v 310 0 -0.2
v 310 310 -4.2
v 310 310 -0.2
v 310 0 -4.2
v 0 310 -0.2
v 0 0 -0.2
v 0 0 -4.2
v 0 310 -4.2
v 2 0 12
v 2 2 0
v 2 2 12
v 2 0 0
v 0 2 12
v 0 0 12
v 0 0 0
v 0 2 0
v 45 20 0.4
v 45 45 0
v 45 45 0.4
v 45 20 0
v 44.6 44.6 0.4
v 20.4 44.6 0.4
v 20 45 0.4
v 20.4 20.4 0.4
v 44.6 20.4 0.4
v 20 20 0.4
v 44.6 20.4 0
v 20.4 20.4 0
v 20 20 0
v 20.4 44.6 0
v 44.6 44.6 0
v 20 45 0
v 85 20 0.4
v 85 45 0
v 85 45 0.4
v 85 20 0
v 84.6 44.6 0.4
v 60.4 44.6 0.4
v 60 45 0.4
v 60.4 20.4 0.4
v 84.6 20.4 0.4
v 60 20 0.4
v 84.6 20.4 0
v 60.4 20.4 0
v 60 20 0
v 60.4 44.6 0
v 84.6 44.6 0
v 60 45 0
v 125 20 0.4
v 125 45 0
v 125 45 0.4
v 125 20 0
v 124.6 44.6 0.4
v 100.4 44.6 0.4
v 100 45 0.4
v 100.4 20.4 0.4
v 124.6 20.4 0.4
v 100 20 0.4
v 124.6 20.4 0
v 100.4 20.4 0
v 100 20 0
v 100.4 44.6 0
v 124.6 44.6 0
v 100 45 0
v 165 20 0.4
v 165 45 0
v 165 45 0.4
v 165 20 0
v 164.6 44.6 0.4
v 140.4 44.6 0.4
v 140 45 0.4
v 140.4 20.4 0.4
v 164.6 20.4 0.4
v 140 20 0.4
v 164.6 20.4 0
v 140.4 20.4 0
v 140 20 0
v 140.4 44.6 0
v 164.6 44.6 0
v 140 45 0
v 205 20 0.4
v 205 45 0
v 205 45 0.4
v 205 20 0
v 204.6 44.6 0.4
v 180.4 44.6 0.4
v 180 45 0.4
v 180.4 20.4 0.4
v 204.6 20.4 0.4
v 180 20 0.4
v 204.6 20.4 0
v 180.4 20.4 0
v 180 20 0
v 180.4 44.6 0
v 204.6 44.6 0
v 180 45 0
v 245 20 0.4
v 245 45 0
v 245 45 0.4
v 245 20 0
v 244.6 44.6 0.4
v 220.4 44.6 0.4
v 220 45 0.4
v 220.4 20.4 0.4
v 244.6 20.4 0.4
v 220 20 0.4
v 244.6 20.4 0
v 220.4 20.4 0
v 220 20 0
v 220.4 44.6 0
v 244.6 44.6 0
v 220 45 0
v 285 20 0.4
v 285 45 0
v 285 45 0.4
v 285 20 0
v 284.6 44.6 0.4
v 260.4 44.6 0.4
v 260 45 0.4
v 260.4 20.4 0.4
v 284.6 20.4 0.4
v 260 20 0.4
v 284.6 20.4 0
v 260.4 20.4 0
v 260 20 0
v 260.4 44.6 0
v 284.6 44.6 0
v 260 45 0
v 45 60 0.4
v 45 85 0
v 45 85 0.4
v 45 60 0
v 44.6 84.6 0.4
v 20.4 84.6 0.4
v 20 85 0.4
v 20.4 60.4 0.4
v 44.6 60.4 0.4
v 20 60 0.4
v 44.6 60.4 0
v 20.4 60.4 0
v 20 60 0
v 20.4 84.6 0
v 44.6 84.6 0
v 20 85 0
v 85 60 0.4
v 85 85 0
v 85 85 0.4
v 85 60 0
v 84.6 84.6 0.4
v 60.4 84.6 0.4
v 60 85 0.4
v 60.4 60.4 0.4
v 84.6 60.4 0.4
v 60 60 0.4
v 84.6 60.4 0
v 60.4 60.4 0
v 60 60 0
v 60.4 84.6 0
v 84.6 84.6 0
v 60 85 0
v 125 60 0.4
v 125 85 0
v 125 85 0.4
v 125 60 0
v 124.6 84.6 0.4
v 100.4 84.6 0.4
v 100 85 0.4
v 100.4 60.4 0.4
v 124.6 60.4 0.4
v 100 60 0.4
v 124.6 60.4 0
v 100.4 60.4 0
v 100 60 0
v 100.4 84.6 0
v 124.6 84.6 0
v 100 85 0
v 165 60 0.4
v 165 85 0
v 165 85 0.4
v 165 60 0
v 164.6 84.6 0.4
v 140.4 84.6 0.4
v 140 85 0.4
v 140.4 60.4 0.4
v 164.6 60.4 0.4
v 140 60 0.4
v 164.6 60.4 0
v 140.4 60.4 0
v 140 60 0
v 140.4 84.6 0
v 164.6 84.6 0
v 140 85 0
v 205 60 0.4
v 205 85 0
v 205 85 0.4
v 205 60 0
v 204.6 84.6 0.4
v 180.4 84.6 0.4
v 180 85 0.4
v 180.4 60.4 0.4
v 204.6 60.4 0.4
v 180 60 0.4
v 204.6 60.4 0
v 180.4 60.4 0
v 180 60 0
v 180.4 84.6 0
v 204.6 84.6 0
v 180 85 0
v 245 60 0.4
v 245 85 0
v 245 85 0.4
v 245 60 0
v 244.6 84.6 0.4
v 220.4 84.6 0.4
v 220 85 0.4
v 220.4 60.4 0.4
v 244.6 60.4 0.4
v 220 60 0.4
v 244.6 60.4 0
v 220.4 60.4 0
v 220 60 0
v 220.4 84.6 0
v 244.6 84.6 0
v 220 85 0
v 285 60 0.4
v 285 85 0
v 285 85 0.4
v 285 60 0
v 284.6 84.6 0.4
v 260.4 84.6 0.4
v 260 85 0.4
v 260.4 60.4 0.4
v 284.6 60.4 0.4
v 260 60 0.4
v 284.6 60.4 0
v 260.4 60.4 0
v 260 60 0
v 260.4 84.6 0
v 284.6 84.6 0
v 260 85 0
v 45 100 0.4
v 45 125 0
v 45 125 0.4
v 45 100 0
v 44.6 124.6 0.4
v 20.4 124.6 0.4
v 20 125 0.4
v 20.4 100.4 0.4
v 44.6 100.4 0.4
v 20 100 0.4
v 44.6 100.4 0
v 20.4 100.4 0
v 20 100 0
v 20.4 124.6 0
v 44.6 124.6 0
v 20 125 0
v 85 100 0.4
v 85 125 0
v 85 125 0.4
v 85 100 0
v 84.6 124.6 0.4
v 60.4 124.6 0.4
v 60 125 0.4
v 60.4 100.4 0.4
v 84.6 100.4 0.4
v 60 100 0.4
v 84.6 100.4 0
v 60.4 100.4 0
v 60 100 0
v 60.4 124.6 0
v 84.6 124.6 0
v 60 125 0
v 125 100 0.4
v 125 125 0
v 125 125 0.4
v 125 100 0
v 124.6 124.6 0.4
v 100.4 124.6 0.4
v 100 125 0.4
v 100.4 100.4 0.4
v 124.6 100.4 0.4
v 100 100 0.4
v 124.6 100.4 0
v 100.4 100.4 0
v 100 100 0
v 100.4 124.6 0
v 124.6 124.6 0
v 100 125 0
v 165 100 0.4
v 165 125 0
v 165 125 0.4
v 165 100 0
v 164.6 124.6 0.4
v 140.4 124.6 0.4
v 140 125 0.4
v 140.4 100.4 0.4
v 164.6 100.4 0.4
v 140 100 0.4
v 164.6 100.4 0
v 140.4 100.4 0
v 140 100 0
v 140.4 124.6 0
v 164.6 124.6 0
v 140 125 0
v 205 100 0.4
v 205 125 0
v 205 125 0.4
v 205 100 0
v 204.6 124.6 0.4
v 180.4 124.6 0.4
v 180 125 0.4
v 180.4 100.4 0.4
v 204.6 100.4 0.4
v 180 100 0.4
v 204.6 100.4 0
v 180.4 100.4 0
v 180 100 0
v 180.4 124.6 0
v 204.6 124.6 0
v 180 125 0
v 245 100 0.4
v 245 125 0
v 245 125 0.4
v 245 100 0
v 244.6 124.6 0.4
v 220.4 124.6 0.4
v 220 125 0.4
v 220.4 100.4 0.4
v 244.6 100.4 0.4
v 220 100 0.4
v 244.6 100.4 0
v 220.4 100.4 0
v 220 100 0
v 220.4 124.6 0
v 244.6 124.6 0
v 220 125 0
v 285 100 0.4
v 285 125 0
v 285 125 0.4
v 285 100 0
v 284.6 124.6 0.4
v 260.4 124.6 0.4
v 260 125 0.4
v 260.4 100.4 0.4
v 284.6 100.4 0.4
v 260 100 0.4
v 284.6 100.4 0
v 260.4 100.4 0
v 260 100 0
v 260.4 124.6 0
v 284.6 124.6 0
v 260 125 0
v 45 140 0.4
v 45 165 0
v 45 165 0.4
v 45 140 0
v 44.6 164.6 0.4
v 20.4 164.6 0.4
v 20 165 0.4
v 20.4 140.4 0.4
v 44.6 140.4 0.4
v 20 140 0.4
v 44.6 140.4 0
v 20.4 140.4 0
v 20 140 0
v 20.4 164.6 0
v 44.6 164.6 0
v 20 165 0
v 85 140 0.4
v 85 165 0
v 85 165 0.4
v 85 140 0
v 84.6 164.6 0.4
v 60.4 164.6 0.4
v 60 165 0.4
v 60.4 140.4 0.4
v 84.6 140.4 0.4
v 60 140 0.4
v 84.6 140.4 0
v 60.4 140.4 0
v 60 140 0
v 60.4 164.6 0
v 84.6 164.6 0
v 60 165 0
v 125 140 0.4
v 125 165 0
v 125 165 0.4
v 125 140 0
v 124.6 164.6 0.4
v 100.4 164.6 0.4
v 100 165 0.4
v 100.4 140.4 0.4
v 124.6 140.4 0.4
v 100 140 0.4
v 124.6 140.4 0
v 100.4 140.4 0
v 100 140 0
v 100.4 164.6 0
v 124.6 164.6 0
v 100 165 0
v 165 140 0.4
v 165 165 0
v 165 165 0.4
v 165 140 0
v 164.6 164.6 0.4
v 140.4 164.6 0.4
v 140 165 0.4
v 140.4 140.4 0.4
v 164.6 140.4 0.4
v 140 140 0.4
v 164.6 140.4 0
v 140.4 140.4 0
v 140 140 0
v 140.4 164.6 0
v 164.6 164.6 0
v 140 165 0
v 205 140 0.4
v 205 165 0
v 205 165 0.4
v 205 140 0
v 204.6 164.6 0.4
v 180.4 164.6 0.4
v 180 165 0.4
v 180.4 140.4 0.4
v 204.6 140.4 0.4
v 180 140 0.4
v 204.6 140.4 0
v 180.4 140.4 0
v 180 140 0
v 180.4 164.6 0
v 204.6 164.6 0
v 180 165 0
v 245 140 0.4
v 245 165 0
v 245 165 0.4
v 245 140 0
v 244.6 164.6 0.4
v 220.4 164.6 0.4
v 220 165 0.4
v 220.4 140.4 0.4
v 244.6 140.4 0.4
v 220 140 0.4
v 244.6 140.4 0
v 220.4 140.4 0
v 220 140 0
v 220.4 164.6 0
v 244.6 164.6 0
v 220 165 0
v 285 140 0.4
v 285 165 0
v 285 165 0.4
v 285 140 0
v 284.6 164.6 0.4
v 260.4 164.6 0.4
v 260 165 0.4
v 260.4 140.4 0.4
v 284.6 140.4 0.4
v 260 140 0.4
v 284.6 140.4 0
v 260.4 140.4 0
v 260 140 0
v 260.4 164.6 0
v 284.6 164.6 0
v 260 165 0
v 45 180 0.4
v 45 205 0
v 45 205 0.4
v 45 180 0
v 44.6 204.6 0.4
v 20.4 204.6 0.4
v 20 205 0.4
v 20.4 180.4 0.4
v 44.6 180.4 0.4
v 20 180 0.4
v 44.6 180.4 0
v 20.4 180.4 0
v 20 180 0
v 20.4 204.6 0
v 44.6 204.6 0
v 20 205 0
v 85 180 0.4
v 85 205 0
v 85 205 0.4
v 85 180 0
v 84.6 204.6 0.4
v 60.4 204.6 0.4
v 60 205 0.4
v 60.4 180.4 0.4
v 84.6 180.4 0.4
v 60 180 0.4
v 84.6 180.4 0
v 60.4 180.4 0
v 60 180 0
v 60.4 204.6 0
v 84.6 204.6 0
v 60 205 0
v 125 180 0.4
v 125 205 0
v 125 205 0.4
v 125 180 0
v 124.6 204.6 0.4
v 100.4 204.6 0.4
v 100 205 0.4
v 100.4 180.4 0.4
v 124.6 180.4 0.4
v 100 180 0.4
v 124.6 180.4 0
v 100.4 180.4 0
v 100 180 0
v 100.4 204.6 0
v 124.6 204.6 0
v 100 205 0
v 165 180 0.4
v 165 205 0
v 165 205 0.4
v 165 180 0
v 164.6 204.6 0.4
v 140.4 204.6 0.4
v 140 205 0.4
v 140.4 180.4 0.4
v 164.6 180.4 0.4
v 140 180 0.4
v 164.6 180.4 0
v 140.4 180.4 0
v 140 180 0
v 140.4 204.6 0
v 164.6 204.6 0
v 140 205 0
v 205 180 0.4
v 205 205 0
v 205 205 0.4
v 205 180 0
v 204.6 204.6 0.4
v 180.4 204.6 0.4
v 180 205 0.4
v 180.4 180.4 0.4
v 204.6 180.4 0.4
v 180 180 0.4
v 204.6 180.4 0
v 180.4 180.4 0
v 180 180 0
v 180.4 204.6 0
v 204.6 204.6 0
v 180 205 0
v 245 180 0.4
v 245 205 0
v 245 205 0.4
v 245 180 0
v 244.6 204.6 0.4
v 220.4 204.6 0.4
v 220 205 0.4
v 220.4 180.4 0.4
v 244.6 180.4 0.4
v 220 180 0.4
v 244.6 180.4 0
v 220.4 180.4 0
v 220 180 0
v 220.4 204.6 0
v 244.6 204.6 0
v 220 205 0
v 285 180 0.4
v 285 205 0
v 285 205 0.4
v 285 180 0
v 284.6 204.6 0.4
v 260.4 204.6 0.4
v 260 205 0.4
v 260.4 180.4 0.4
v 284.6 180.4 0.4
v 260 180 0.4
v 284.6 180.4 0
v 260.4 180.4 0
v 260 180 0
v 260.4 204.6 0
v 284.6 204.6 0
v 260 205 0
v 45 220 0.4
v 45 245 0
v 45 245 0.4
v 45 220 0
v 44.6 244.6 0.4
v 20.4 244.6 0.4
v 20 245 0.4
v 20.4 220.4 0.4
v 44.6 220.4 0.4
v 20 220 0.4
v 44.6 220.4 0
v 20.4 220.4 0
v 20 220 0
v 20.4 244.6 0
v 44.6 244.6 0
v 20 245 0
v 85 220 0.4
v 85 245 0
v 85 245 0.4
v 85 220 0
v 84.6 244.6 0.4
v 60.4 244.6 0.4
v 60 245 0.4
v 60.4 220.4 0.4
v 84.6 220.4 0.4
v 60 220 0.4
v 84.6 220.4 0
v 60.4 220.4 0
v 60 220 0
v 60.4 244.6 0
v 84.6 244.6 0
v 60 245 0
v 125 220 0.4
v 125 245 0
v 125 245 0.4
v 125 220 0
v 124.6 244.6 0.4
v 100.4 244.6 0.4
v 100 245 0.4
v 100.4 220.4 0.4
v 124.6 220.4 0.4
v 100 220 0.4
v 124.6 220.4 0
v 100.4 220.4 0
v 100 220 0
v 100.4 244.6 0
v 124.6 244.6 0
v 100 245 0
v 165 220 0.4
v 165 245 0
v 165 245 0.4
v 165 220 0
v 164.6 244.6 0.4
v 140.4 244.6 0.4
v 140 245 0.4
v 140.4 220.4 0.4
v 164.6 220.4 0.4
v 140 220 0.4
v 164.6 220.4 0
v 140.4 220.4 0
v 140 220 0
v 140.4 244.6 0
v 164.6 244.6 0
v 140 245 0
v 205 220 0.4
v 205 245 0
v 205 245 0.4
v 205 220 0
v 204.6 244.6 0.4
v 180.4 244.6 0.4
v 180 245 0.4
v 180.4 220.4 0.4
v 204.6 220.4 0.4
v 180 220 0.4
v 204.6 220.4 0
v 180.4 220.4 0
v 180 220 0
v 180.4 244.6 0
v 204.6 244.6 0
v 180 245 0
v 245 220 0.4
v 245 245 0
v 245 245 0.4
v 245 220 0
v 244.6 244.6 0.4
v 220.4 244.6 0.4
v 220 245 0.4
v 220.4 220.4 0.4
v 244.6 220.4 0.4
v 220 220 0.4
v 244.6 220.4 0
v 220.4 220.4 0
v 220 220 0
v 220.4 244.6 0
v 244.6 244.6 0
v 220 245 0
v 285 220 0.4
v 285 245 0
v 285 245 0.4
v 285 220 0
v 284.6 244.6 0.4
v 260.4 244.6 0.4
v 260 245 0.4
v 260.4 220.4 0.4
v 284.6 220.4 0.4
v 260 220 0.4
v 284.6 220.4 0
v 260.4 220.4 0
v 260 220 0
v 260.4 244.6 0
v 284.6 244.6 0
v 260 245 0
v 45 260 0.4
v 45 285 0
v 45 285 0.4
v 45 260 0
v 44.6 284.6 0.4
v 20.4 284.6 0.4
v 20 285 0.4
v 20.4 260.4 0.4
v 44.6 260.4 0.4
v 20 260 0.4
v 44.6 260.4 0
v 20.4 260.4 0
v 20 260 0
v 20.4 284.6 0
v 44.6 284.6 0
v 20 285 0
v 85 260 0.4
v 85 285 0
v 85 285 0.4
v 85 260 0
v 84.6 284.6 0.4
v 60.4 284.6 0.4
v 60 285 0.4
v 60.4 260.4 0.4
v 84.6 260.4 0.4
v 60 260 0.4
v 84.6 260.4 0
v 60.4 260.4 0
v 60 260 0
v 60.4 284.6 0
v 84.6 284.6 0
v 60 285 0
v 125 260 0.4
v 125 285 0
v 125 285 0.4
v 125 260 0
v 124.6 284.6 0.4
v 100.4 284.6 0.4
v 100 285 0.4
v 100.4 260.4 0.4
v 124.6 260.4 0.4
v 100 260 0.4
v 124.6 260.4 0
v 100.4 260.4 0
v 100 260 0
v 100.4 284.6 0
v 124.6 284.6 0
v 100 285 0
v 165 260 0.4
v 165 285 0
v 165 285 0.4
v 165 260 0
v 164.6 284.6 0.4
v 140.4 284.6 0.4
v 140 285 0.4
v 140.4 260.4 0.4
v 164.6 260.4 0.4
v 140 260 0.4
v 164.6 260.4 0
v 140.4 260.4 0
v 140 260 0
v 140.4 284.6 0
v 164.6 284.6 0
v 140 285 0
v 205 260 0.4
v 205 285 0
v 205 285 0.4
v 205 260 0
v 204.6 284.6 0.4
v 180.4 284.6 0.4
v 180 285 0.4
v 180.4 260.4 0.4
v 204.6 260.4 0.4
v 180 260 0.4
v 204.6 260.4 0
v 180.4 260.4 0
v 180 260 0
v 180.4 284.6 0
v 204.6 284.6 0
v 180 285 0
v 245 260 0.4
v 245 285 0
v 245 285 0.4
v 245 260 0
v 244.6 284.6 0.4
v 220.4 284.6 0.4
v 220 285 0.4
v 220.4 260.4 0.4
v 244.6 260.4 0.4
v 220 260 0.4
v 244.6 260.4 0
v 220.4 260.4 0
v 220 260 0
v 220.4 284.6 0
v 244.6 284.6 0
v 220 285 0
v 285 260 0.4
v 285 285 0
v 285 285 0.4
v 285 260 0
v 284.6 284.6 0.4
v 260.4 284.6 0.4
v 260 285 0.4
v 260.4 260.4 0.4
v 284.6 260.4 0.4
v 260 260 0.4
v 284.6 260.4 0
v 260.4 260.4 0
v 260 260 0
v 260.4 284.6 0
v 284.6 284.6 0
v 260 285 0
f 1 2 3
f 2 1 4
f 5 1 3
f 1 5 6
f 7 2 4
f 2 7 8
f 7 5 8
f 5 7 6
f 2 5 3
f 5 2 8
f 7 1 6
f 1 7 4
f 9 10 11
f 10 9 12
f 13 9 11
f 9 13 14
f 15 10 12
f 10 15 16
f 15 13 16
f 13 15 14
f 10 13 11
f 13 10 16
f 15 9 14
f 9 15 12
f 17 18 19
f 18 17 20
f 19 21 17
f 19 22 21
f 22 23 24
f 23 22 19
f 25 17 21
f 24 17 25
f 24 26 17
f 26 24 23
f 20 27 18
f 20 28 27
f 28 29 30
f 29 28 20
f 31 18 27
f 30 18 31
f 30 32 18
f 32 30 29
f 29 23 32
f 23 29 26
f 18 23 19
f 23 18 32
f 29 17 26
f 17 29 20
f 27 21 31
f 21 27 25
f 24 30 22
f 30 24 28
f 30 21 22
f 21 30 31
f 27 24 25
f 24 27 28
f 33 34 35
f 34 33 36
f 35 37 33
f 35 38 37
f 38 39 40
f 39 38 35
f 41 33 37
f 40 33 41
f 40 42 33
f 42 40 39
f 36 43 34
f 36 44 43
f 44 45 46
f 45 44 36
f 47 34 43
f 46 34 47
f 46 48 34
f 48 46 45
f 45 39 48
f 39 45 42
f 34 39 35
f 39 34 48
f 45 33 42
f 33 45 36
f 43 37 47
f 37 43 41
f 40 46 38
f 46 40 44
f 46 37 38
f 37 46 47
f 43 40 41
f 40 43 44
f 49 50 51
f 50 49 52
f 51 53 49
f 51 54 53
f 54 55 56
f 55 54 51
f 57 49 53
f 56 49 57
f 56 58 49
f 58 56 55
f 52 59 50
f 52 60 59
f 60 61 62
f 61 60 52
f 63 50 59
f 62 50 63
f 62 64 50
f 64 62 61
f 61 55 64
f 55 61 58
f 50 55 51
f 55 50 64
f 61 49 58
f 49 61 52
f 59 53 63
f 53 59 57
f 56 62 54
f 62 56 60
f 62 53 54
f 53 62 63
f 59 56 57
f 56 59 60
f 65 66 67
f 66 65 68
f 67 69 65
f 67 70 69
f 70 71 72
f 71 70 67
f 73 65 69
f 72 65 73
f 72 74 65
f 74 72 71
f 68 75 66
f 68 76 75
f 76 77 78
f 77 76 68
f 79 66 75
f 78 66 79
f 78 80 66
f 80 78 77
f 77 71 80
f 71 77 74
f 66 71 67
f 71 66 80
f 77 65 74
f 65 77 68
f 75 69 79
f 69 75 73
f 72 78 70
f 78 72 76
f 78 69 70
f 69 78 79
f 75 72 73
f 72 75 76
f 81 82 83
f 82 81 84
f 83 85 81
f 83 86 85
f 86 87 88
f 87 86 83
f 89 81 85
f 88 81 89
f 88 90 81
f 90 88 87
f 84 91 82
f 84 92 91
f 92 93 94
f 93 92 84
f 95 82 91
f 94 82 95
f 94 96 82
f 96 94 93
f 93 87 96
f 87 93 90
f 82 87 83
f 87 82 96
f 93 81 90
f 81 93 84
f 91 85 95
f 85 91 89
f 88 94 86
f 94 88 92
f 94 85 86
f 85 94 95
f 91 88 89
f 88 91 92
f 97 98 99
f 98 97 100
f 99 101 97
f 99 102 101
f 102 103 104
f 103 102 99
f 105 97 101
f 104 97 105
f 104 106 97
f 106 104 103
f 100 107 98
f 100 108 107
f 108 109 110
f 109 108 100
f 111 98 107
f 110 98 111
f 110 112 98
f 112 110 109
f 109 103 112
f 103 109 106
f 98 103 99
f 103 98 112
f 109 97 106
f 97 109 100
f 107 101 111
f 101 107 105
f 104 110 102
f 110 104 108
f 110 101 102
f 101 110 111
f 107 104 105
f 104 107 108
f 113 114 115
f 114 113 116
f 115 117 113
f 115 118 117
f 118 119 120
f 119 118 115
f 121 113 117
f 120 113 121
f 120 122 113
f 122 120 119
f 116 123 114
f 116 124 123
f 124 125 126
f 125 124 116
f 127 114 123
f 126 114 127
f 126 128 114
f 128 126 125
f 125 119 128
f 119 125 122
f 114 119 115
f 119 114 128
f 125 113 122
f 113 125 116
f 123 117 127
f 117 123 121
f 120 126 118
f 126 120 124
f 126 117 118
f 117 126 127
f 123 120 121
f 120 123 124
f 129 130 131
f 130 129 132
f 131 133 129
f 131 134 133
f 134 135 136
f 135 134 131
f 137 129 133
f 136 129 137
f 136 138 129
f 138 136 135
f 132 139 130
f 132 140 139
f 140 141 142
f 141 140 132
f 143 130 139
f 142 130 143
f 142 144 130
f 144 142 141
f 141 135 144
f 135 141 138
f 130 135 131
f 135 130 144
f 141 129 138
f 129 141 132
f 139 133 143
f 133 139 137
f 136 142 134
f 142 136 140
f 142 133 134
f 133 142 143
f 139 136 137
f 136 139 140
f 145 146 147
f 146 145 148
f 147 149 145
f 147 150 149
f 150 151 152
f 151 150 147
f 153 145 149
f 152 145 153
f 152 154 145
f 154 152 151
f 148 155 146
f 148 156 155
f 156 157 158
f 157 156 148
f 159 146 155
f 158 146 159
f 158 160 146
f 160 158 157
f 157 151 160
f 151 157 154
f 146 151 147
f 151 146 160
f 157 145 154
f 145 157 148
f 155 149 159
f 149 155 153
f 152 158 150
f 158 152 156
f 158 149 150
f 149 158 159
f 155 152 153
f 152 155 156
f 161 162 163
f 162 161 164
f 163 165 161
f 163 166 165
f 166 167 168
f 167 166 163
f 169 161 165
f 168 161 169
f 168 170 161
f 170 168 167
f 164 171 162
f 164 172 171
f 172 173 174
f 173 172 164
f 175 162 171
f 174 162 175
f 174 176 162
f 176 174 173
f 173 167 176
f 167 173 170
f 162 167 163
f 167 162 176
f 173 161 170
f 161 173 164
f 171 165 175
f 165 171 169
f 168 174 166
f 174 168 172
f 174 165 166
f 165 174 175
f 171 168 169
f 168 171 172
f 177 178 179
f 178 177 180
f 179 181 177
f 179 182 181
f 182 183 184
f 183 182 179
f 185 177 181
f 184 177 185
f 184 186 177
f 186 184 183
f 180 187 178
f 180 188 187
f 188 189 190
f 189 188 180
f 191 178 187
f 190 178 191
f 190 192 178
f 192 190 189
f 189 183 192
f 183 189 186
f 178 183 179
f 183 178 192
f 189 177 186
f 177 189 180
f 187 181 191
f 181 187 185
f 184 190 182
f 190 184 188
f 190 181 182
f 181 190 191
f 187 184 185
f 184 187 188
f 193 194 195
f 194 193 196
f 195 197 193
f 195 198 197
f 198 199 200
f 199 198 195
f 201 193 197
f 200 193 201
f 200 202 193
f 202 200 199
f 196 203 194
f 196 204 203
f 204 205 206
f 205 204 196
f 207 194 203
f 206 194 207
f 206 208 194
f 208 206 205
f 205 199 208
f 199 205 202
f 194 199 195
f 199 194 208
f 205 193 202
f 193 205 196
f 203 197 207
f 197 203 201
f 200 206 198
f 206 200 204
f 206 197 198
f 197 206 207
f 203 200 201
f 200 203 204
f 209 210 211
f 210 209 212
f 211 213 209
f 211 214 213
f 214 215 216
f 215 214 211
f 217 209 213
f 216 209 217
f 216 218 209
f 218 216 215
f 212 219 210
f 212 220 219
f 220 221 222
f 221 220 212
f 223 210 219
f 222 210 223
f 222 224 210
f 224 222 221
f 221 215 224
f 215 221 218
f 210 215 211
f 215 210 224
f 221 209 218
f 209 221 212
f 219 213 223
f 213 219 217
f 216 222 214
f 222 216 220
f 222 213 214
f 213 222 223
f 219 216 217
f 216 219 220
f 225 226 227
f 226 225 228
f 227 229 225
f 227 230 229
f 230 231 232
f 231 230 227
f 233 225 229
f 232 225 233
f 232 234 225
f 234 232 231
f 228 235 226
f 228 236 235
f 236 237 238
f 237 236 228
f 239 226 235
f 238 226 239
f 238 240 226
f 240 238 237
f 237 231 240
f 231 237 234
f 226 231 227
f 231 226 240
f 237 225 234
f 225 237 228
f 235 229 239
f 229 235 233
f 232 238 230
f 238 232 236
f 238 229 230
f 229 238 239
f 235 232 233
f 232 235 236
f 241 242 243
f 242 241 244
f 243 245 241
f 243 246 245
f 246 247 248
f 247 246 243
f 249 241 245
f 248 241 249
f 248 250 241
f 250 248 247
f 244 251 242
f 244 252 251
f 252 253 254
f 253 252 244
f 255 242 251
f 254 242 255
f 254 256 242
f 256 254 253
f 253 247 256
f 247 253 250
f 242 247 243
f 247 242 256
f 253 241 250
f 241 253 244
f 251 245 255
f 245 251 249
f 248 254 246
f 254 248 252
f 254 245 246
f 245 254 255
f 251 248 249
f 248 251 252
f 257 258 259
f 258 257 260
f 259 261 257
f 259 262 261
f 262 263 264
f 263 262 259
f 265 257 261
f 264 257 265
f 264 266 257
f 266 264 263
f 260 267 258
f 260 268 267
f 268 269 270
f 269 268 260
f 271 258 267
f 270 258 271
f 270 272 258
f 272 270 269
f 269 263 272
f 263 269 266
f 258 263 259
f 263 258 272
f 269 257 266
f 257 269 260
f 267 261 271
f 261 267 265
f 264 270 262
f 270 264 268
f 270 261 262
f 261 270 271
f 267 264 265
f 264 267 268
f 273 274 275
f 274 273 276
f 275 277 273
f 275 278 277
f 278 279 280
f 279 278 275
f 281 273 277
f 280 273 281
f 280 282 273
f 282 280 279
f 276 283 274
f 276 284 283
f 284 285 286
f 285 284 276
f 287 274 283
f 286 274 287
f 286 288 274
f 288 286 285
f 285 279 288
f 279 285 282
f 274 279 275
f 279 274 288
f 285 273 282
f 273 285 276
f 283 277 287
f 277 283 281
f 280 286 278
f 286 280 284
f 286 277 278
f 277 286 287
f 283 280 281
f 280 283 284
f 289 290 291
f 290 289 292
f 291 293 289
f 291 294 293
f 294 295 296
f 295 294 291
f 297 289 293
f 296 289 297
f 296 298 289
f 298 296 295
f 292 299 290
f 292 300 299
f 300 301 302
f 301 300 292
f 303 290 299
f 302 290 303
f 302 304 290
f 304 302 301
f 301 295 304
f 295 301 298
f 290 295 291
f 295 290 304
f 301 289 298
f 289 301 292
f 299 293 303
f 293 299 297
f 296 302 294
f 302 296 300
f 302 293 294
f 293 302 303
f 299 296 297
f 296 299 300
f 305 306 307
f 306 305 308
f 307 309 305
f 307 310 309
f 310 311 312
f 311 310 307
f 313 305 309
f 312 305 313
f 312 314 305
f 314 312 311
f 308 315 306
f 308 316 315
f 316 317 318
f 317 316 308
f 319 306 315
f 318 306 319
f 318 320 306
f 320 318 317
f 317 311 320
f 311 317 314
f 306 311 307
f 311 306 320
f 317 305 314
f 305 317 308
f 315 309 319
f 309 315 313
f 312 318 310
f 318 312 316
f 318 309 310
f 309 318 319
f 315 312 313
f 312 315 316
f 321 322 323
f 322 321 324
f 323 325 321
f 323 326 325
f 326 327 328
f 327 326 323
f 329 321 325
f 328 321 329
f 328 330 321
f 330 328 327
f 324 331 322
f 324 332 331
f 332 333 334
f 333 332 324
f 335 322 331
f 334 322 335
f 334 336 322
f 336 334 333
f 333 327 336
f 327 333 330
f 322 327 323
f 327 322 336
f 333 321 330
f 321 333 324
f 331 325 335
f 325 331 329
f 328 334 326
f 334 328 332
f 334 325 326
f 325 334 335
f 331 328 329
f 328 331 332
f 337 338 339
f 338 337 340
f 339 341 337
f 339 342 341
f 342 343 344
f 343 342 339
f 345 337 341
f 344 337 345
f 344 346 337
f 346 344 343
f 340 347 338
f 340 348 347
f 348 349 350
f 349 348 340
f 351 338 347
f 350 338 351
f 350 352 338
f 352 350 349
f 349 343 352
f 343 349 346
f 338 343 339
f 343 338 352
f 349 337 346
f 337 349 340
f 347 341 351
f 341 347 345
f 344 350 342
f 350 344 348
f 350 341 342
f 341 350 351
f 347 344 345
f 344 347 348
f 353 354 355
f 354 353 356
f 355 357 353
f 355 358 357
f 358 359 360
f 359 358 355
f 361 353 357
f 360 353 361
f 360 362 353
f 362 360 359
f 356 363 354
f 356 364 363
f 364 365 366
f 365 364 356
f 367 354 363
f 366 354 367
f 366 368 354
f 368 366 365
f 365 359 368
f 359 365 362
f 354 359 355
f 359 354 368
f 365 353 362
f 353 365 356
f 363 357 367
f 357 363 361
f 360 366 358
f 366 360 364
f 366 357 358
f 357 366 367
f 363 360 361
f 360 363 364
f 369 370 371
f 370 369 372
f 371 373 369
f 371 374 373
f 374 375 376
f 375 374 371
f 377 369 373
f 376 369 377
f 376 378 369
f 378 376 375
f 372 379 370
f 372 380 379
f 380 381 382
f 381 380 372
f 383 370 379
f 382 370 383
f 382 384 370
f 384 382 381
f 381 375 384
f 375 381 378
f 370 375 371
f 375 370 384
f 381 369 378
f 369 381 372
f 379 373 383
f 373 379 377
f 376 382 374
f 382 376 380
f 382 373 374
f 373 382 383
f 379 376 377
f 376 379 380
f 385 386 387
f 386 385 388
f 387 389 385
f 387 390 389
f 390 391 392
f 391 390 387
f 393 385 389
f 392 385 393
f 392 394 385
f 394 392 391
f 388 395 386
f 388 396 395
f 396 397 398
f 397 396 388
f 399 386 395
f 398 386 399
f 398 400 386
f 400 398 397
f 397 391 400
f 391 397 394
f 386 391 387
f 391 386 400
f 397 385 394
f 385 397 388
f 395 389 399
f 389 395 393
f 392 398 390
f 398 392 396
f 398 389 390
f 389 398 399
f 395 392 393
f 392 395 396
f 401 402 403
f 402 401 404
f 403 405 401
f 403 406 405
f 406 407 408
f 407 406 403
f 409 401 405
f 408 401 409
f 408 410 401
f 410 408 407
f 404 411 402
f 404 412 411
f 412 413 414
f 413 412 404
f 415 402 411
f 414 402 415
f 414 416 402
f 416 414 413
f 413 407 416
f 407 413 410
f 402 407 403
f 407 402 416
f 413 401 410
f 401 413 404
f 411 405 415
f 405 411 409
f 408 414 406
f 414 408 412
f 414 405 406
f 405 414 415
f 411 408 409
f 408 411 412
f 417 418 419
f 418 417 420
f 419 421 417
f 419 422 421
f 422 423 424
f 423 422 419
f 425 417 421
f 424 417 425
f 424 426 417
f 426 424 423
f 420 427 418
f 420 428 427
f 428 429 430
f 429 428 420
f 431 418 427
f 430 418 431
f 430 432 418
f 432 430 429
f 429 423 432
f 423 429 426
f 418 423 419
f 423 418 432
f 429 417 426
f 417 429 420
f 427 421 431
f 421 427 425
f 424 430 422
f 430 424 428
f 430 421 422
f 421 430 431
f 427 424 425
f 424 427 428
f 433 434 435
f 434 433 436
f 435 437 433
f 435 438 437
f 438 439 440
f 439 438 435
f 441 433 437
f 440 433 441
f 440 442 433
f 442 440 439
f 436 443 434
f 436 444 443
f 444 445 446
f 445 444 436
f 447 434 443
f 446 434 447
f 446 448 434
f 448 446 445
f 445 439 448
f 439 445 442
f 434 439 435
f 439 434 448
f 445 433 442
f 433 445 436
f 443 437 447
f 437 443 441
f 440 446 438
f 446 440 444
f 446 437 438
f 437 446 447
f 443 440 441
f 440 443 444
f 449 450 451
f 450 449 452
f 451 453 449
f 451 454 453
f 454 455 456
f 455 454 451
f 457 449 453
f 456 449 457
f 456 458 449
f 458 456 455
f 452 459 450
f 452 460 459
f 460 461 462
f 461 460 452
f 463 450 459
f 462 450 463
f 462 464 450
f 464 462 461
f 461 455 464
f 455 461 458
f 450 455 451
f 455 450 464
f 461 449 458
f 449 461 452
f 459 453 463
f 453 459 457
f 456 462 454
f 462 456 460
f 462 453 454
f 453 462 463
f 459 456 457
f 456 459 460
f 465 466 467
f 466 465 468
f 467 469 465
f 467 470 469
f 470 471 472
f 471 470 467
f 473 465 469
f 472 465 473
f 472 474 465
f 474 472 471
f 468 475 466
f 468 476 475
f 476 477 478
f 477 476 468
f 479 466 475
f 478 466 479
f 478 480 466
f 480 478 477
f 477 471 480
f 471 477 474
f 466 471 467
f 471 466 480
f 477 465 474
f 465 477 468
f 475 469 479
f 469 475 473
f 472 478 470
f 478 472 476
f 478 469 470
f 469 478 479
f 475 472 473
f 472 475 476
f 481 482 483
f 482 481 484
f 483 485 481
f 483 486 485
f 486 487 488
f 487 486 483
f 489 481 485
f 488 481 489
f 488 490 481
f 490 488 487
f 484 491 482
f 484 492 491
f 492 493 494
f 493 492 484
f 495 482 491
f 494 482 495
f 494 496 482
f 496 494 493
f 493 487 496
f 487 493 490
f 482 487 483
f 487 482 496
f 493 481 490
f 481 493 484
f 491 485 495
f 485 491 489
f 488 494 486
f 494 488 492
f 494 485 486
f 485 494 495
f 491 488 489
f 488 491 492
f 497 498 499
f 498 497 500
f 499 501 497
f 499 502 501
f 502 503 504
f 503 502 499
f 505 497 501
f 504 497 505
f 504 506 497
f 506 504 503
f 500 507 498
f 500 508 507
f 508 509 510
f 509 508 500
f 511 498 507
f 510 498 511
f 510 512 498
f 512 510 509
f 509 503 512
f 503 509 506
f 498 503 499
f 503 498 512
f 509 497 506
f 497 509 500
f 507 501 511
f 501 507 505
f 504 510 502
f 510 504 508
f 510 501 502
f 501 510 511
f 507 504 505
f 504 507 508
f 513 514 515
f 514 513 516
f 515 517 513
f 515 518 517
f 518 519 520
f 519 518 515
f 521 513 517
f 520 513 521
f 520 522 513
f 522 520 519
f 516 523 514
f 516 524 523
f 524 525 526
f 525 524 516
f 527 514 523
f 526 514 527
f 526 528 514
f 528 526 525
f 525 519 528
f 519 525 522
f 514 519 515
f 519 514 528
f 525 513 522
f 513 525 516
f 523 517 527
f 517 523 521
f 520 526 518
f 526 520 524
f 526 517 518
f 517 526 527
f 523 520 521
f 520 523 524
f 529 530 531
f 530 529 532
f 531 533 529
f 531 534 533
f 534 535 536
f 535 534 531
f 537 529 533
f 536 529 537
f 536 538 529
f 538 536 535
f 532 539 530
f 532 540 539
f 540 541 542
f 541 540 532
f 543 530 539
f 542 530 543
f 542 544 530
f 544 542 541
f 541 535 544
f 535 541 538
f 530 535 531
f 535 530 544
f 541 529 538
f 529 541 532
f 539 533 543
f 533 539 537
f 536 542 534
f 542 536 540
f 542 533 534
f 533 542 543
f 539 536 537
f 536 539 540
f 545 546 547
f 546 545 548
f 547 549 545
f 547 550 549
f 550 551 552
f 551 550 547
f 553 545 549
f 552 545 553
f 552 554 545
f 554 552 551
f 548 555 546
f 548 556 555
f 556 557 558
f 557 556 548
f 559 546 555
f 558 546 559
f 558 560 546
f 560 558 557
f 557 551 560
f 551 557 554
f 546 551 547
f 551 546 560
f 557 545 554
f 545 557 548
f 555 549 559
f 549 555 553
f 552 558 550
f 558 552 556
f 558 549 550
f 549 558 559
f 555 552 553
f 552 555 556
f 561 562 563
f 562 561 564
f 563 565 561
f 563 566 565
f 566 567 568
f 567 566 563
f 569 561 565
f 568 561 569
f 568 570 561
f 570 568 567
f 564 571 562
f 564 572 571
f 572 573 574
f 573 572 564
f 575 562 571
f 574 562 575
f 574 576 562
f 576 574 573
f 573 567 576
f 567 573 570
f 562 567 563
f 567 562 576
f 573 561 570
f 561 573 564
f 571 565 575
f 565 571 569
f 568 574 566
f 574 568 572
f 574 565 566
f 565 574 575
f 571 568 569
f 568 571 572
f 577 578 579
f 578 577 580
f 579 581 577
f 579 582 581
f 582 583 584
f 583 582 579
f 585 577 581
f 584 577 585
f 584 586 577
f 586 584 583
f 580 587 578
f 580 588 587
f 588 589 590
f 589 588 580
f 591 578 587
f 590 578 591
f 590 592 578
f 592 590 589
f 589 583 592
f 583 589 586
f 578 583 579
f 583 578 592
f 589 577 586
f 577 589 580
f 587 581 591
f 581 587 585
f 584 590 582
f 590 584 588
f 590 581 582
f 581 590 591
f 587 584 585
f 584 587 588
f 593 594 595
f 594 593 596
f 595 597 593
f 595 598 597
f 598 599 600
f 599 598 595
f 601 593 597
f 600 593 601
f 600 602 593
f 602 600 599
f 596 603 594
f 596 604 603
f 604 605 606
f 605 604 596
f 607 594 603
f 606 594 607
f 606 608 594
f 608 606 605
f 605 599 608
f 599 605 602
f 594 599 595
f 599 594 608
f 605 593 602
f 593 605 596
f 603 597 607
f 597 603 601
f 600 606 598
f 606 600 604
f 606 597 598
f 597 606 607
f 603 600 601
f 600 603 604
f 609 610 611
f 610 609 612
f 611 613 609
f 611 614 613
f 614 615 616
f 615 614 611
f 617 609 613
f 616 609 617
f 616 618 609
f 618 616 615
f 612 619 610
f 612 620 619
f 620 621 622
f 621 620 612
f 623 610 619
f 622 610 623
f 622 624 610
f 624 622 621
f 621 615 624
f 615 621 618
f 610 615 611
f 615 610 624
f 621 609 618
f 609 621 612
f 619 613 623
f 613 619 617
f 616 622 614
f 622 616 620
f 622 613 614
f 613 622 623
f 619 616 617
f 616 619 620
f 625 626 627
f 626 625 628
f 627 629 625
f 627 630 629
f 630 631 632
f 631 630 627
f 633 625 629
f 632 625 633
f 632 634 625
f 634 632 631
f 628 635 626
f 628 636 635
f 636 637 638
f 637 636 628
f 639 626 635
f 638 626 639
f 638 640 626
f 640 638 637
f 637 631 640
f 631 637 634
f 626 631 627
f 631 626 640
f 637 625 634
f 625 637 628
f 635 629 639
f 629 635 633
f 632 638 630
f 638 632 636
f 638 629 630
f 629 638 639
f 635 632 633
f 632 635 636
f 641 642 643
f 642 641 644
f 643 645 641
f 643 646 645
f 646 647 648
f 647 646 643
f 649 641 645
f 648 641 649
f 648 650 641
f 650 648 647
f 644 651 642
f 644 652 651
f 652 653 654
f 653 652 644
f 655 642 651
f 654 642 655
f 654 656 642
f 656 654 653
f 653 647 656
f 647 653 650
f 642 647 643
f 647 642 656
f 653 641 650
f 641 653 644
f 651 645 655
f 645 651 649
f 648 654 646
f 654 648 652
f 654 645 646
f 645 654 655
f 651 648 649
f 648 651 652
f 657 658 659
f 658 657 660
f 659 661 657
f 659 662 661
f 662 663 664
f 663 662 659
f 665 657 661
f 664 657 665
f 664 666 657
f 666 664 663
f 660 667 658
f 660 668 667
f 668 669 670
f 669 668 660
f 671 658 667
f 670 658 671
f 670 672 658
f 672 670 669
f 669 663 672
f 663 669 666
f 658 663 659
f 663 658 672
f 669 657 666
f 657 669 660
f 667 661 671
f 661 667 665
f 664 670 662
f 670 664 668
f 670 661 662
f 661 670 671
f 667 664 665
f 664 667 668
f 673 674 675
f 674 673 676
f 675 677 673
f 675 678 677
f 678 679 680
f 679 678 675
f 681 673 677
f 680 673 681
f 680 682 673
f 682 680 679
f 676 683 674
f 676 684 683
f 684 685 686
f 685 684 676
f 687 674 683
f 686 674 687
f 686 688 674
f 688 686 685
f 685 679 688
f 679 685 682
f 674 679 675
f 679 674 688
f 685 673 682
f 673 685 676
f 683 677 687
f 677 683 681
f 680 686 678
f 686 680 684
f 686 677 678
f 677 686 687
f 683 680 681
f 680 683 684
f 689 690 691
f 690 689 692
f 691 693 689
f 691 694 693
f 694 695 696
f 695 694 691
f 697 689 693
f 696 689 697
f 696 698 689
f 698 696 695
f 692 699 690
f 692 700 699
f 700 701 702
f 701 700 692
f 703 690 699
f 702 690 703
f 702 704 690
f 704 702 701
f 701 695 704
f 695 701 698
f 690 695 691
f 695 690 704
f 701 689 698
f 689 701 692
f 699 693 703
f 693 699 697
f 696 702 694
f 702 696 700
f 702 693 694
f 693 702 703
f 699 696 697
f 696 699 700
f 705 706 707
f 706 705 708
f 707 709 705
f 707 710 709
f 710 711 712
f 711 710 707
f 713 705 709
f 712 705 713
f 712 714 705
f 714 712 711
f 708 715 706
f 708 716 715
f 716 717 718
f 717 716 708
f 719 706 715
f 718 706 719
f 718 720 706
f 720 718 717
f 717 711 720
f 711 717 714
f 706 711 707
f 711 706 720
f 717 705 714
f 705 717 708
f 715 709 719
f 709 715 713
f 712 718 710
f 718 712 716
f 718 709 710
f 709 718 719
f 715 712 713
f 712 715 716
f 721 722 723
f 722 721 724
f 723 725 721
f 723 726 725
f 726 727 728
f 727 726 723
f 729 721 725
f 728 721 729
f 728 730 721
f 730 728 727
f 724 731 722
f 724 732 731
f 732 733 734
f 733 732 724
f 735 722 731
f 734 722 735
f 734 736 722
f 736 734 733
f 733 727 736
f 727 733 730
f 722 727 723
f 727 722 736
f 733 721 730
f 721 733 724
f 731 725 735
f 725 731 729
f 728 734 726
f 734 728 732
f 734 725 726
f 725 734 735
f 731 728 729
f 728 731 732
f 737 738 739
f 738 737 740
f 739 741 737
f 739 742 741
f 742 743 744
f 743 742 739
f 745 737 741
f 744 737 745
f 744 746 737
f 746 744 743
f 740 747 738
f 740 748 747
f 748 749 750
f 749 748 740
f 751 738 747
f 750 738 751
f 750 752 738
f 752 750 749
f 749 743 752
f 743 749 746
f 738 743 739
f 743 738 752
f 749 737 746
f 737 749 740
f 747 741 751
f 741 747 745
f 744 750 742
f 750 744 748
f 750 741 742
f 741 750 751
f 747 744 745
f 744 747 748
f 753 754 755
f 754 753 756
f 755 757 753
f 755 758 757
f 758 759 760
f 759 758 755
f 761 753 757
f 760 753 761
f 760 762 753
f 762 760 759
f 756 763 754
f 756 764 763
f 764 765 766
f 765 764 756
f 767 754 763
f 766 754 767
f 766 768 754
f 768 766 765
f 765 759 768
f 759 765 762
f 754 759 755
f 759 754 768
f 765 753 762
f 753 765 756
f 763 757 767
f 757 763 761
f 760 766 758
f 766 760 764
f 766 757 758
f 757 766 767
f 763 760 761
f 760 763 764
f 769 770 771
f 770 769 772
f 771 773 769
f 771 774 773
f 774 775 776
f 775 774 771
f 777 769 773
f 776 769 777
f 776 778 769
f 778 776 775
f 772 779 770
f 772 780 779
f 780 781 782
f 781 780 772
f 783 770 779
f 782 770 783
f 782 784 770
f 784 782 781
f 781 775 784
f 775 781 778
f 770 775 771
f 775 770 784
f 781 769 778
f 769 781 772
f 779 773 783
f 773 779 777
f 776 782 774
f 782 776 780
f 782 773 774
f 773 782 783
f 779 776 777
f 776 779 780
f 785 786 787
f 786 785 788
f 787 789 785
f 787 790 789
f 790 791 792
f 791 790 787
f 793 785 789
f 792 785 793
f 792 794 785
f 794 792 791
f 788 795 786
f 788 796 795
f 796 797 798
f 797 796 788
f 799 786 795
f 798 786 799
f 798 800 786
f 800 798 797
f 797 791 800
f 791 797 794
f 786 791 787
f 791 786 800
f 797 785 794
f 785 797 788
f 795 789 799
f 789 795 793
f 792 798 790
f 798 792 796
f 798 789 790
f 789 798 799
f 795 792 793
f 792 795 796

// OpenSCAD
//
//   Thin calibration squares
//   Copyright (C) 2020 Sarah Kelley, sarah@sakelley.org
//

/* [Bed] */

// X size of your bed in mm
bedXSize = 310;

// Y size of your bed in mm
bedYSize = 310;

// Cosmetic: when showing bed, how thick to draw it?
bedThickness = 4;

// Cosmetic: helps visualize final result. TURN OFF BEFORE FINAL RENDER.
showBed = true;

/* [Squares] */

// Size of little squares, in mm
squareSize = 25; // [10:5:50]

// Thickness of little squares, in mm
squareThickness = 0.4;  // [0.2:0.1:2.0]

// How far apart to space the squares
squareSpacing = 1.6; // [1.0:0.1:2.0]

// Margin from edges of print surface
margin = 20; // [0:60]



module testSquares(showBed=true, bedXSize, bedYSize, bedThickness,
        squareSize, squareThickness, margin) {

    module squareThing(size=10, thickness=0.4) {
        difference() {
            sInner = size - (2 * thickness);
            tInner = thickness + 0.2;
            translate([0,0,thickness/2]) 
                cube([size, size, thickness],center=true);
            translate([0,0,(tInner/2)-(tInner-thickness)/2]) 
                cube([sInner, sInner, tInner], center=true);
        }
    }

    module bed(bedXSize, bedYSize, bedThickness) {
        color("black") 
            translate([0,0,-bedThickness-0.2])
                cube([bedXSize, bedYSize, bedThickness]);
        color("red")
                cube([2, 2, bedThickness*3]);
    }
    
    if (showBed) bed(bedXSize, bedYSize, bedThickness);
    
    for (y = [margin+(squareSize/2):squareSize*squareSpacing:bedYSize - margin-(squareSize/2)]) {
        for (x = [margin+(squareSize/2):squareSize*squareSpacing:bedXSize - margin-(squareSize/2)]) {
            translate([x,y,0]) 
                squareThing(size=squareSize, thickness=squareThickness);
        }
    }
}


testSquares(
    showBed=showBed,
    bedXSize=bedXSize, 
    bedYSize=bedYSize,
    bedThickness=bedThickness,
    squareSize=squareSize, 
    squareThickness=squareThickness,
    squareSpacing=squareSpacing,
    margin=margin);
